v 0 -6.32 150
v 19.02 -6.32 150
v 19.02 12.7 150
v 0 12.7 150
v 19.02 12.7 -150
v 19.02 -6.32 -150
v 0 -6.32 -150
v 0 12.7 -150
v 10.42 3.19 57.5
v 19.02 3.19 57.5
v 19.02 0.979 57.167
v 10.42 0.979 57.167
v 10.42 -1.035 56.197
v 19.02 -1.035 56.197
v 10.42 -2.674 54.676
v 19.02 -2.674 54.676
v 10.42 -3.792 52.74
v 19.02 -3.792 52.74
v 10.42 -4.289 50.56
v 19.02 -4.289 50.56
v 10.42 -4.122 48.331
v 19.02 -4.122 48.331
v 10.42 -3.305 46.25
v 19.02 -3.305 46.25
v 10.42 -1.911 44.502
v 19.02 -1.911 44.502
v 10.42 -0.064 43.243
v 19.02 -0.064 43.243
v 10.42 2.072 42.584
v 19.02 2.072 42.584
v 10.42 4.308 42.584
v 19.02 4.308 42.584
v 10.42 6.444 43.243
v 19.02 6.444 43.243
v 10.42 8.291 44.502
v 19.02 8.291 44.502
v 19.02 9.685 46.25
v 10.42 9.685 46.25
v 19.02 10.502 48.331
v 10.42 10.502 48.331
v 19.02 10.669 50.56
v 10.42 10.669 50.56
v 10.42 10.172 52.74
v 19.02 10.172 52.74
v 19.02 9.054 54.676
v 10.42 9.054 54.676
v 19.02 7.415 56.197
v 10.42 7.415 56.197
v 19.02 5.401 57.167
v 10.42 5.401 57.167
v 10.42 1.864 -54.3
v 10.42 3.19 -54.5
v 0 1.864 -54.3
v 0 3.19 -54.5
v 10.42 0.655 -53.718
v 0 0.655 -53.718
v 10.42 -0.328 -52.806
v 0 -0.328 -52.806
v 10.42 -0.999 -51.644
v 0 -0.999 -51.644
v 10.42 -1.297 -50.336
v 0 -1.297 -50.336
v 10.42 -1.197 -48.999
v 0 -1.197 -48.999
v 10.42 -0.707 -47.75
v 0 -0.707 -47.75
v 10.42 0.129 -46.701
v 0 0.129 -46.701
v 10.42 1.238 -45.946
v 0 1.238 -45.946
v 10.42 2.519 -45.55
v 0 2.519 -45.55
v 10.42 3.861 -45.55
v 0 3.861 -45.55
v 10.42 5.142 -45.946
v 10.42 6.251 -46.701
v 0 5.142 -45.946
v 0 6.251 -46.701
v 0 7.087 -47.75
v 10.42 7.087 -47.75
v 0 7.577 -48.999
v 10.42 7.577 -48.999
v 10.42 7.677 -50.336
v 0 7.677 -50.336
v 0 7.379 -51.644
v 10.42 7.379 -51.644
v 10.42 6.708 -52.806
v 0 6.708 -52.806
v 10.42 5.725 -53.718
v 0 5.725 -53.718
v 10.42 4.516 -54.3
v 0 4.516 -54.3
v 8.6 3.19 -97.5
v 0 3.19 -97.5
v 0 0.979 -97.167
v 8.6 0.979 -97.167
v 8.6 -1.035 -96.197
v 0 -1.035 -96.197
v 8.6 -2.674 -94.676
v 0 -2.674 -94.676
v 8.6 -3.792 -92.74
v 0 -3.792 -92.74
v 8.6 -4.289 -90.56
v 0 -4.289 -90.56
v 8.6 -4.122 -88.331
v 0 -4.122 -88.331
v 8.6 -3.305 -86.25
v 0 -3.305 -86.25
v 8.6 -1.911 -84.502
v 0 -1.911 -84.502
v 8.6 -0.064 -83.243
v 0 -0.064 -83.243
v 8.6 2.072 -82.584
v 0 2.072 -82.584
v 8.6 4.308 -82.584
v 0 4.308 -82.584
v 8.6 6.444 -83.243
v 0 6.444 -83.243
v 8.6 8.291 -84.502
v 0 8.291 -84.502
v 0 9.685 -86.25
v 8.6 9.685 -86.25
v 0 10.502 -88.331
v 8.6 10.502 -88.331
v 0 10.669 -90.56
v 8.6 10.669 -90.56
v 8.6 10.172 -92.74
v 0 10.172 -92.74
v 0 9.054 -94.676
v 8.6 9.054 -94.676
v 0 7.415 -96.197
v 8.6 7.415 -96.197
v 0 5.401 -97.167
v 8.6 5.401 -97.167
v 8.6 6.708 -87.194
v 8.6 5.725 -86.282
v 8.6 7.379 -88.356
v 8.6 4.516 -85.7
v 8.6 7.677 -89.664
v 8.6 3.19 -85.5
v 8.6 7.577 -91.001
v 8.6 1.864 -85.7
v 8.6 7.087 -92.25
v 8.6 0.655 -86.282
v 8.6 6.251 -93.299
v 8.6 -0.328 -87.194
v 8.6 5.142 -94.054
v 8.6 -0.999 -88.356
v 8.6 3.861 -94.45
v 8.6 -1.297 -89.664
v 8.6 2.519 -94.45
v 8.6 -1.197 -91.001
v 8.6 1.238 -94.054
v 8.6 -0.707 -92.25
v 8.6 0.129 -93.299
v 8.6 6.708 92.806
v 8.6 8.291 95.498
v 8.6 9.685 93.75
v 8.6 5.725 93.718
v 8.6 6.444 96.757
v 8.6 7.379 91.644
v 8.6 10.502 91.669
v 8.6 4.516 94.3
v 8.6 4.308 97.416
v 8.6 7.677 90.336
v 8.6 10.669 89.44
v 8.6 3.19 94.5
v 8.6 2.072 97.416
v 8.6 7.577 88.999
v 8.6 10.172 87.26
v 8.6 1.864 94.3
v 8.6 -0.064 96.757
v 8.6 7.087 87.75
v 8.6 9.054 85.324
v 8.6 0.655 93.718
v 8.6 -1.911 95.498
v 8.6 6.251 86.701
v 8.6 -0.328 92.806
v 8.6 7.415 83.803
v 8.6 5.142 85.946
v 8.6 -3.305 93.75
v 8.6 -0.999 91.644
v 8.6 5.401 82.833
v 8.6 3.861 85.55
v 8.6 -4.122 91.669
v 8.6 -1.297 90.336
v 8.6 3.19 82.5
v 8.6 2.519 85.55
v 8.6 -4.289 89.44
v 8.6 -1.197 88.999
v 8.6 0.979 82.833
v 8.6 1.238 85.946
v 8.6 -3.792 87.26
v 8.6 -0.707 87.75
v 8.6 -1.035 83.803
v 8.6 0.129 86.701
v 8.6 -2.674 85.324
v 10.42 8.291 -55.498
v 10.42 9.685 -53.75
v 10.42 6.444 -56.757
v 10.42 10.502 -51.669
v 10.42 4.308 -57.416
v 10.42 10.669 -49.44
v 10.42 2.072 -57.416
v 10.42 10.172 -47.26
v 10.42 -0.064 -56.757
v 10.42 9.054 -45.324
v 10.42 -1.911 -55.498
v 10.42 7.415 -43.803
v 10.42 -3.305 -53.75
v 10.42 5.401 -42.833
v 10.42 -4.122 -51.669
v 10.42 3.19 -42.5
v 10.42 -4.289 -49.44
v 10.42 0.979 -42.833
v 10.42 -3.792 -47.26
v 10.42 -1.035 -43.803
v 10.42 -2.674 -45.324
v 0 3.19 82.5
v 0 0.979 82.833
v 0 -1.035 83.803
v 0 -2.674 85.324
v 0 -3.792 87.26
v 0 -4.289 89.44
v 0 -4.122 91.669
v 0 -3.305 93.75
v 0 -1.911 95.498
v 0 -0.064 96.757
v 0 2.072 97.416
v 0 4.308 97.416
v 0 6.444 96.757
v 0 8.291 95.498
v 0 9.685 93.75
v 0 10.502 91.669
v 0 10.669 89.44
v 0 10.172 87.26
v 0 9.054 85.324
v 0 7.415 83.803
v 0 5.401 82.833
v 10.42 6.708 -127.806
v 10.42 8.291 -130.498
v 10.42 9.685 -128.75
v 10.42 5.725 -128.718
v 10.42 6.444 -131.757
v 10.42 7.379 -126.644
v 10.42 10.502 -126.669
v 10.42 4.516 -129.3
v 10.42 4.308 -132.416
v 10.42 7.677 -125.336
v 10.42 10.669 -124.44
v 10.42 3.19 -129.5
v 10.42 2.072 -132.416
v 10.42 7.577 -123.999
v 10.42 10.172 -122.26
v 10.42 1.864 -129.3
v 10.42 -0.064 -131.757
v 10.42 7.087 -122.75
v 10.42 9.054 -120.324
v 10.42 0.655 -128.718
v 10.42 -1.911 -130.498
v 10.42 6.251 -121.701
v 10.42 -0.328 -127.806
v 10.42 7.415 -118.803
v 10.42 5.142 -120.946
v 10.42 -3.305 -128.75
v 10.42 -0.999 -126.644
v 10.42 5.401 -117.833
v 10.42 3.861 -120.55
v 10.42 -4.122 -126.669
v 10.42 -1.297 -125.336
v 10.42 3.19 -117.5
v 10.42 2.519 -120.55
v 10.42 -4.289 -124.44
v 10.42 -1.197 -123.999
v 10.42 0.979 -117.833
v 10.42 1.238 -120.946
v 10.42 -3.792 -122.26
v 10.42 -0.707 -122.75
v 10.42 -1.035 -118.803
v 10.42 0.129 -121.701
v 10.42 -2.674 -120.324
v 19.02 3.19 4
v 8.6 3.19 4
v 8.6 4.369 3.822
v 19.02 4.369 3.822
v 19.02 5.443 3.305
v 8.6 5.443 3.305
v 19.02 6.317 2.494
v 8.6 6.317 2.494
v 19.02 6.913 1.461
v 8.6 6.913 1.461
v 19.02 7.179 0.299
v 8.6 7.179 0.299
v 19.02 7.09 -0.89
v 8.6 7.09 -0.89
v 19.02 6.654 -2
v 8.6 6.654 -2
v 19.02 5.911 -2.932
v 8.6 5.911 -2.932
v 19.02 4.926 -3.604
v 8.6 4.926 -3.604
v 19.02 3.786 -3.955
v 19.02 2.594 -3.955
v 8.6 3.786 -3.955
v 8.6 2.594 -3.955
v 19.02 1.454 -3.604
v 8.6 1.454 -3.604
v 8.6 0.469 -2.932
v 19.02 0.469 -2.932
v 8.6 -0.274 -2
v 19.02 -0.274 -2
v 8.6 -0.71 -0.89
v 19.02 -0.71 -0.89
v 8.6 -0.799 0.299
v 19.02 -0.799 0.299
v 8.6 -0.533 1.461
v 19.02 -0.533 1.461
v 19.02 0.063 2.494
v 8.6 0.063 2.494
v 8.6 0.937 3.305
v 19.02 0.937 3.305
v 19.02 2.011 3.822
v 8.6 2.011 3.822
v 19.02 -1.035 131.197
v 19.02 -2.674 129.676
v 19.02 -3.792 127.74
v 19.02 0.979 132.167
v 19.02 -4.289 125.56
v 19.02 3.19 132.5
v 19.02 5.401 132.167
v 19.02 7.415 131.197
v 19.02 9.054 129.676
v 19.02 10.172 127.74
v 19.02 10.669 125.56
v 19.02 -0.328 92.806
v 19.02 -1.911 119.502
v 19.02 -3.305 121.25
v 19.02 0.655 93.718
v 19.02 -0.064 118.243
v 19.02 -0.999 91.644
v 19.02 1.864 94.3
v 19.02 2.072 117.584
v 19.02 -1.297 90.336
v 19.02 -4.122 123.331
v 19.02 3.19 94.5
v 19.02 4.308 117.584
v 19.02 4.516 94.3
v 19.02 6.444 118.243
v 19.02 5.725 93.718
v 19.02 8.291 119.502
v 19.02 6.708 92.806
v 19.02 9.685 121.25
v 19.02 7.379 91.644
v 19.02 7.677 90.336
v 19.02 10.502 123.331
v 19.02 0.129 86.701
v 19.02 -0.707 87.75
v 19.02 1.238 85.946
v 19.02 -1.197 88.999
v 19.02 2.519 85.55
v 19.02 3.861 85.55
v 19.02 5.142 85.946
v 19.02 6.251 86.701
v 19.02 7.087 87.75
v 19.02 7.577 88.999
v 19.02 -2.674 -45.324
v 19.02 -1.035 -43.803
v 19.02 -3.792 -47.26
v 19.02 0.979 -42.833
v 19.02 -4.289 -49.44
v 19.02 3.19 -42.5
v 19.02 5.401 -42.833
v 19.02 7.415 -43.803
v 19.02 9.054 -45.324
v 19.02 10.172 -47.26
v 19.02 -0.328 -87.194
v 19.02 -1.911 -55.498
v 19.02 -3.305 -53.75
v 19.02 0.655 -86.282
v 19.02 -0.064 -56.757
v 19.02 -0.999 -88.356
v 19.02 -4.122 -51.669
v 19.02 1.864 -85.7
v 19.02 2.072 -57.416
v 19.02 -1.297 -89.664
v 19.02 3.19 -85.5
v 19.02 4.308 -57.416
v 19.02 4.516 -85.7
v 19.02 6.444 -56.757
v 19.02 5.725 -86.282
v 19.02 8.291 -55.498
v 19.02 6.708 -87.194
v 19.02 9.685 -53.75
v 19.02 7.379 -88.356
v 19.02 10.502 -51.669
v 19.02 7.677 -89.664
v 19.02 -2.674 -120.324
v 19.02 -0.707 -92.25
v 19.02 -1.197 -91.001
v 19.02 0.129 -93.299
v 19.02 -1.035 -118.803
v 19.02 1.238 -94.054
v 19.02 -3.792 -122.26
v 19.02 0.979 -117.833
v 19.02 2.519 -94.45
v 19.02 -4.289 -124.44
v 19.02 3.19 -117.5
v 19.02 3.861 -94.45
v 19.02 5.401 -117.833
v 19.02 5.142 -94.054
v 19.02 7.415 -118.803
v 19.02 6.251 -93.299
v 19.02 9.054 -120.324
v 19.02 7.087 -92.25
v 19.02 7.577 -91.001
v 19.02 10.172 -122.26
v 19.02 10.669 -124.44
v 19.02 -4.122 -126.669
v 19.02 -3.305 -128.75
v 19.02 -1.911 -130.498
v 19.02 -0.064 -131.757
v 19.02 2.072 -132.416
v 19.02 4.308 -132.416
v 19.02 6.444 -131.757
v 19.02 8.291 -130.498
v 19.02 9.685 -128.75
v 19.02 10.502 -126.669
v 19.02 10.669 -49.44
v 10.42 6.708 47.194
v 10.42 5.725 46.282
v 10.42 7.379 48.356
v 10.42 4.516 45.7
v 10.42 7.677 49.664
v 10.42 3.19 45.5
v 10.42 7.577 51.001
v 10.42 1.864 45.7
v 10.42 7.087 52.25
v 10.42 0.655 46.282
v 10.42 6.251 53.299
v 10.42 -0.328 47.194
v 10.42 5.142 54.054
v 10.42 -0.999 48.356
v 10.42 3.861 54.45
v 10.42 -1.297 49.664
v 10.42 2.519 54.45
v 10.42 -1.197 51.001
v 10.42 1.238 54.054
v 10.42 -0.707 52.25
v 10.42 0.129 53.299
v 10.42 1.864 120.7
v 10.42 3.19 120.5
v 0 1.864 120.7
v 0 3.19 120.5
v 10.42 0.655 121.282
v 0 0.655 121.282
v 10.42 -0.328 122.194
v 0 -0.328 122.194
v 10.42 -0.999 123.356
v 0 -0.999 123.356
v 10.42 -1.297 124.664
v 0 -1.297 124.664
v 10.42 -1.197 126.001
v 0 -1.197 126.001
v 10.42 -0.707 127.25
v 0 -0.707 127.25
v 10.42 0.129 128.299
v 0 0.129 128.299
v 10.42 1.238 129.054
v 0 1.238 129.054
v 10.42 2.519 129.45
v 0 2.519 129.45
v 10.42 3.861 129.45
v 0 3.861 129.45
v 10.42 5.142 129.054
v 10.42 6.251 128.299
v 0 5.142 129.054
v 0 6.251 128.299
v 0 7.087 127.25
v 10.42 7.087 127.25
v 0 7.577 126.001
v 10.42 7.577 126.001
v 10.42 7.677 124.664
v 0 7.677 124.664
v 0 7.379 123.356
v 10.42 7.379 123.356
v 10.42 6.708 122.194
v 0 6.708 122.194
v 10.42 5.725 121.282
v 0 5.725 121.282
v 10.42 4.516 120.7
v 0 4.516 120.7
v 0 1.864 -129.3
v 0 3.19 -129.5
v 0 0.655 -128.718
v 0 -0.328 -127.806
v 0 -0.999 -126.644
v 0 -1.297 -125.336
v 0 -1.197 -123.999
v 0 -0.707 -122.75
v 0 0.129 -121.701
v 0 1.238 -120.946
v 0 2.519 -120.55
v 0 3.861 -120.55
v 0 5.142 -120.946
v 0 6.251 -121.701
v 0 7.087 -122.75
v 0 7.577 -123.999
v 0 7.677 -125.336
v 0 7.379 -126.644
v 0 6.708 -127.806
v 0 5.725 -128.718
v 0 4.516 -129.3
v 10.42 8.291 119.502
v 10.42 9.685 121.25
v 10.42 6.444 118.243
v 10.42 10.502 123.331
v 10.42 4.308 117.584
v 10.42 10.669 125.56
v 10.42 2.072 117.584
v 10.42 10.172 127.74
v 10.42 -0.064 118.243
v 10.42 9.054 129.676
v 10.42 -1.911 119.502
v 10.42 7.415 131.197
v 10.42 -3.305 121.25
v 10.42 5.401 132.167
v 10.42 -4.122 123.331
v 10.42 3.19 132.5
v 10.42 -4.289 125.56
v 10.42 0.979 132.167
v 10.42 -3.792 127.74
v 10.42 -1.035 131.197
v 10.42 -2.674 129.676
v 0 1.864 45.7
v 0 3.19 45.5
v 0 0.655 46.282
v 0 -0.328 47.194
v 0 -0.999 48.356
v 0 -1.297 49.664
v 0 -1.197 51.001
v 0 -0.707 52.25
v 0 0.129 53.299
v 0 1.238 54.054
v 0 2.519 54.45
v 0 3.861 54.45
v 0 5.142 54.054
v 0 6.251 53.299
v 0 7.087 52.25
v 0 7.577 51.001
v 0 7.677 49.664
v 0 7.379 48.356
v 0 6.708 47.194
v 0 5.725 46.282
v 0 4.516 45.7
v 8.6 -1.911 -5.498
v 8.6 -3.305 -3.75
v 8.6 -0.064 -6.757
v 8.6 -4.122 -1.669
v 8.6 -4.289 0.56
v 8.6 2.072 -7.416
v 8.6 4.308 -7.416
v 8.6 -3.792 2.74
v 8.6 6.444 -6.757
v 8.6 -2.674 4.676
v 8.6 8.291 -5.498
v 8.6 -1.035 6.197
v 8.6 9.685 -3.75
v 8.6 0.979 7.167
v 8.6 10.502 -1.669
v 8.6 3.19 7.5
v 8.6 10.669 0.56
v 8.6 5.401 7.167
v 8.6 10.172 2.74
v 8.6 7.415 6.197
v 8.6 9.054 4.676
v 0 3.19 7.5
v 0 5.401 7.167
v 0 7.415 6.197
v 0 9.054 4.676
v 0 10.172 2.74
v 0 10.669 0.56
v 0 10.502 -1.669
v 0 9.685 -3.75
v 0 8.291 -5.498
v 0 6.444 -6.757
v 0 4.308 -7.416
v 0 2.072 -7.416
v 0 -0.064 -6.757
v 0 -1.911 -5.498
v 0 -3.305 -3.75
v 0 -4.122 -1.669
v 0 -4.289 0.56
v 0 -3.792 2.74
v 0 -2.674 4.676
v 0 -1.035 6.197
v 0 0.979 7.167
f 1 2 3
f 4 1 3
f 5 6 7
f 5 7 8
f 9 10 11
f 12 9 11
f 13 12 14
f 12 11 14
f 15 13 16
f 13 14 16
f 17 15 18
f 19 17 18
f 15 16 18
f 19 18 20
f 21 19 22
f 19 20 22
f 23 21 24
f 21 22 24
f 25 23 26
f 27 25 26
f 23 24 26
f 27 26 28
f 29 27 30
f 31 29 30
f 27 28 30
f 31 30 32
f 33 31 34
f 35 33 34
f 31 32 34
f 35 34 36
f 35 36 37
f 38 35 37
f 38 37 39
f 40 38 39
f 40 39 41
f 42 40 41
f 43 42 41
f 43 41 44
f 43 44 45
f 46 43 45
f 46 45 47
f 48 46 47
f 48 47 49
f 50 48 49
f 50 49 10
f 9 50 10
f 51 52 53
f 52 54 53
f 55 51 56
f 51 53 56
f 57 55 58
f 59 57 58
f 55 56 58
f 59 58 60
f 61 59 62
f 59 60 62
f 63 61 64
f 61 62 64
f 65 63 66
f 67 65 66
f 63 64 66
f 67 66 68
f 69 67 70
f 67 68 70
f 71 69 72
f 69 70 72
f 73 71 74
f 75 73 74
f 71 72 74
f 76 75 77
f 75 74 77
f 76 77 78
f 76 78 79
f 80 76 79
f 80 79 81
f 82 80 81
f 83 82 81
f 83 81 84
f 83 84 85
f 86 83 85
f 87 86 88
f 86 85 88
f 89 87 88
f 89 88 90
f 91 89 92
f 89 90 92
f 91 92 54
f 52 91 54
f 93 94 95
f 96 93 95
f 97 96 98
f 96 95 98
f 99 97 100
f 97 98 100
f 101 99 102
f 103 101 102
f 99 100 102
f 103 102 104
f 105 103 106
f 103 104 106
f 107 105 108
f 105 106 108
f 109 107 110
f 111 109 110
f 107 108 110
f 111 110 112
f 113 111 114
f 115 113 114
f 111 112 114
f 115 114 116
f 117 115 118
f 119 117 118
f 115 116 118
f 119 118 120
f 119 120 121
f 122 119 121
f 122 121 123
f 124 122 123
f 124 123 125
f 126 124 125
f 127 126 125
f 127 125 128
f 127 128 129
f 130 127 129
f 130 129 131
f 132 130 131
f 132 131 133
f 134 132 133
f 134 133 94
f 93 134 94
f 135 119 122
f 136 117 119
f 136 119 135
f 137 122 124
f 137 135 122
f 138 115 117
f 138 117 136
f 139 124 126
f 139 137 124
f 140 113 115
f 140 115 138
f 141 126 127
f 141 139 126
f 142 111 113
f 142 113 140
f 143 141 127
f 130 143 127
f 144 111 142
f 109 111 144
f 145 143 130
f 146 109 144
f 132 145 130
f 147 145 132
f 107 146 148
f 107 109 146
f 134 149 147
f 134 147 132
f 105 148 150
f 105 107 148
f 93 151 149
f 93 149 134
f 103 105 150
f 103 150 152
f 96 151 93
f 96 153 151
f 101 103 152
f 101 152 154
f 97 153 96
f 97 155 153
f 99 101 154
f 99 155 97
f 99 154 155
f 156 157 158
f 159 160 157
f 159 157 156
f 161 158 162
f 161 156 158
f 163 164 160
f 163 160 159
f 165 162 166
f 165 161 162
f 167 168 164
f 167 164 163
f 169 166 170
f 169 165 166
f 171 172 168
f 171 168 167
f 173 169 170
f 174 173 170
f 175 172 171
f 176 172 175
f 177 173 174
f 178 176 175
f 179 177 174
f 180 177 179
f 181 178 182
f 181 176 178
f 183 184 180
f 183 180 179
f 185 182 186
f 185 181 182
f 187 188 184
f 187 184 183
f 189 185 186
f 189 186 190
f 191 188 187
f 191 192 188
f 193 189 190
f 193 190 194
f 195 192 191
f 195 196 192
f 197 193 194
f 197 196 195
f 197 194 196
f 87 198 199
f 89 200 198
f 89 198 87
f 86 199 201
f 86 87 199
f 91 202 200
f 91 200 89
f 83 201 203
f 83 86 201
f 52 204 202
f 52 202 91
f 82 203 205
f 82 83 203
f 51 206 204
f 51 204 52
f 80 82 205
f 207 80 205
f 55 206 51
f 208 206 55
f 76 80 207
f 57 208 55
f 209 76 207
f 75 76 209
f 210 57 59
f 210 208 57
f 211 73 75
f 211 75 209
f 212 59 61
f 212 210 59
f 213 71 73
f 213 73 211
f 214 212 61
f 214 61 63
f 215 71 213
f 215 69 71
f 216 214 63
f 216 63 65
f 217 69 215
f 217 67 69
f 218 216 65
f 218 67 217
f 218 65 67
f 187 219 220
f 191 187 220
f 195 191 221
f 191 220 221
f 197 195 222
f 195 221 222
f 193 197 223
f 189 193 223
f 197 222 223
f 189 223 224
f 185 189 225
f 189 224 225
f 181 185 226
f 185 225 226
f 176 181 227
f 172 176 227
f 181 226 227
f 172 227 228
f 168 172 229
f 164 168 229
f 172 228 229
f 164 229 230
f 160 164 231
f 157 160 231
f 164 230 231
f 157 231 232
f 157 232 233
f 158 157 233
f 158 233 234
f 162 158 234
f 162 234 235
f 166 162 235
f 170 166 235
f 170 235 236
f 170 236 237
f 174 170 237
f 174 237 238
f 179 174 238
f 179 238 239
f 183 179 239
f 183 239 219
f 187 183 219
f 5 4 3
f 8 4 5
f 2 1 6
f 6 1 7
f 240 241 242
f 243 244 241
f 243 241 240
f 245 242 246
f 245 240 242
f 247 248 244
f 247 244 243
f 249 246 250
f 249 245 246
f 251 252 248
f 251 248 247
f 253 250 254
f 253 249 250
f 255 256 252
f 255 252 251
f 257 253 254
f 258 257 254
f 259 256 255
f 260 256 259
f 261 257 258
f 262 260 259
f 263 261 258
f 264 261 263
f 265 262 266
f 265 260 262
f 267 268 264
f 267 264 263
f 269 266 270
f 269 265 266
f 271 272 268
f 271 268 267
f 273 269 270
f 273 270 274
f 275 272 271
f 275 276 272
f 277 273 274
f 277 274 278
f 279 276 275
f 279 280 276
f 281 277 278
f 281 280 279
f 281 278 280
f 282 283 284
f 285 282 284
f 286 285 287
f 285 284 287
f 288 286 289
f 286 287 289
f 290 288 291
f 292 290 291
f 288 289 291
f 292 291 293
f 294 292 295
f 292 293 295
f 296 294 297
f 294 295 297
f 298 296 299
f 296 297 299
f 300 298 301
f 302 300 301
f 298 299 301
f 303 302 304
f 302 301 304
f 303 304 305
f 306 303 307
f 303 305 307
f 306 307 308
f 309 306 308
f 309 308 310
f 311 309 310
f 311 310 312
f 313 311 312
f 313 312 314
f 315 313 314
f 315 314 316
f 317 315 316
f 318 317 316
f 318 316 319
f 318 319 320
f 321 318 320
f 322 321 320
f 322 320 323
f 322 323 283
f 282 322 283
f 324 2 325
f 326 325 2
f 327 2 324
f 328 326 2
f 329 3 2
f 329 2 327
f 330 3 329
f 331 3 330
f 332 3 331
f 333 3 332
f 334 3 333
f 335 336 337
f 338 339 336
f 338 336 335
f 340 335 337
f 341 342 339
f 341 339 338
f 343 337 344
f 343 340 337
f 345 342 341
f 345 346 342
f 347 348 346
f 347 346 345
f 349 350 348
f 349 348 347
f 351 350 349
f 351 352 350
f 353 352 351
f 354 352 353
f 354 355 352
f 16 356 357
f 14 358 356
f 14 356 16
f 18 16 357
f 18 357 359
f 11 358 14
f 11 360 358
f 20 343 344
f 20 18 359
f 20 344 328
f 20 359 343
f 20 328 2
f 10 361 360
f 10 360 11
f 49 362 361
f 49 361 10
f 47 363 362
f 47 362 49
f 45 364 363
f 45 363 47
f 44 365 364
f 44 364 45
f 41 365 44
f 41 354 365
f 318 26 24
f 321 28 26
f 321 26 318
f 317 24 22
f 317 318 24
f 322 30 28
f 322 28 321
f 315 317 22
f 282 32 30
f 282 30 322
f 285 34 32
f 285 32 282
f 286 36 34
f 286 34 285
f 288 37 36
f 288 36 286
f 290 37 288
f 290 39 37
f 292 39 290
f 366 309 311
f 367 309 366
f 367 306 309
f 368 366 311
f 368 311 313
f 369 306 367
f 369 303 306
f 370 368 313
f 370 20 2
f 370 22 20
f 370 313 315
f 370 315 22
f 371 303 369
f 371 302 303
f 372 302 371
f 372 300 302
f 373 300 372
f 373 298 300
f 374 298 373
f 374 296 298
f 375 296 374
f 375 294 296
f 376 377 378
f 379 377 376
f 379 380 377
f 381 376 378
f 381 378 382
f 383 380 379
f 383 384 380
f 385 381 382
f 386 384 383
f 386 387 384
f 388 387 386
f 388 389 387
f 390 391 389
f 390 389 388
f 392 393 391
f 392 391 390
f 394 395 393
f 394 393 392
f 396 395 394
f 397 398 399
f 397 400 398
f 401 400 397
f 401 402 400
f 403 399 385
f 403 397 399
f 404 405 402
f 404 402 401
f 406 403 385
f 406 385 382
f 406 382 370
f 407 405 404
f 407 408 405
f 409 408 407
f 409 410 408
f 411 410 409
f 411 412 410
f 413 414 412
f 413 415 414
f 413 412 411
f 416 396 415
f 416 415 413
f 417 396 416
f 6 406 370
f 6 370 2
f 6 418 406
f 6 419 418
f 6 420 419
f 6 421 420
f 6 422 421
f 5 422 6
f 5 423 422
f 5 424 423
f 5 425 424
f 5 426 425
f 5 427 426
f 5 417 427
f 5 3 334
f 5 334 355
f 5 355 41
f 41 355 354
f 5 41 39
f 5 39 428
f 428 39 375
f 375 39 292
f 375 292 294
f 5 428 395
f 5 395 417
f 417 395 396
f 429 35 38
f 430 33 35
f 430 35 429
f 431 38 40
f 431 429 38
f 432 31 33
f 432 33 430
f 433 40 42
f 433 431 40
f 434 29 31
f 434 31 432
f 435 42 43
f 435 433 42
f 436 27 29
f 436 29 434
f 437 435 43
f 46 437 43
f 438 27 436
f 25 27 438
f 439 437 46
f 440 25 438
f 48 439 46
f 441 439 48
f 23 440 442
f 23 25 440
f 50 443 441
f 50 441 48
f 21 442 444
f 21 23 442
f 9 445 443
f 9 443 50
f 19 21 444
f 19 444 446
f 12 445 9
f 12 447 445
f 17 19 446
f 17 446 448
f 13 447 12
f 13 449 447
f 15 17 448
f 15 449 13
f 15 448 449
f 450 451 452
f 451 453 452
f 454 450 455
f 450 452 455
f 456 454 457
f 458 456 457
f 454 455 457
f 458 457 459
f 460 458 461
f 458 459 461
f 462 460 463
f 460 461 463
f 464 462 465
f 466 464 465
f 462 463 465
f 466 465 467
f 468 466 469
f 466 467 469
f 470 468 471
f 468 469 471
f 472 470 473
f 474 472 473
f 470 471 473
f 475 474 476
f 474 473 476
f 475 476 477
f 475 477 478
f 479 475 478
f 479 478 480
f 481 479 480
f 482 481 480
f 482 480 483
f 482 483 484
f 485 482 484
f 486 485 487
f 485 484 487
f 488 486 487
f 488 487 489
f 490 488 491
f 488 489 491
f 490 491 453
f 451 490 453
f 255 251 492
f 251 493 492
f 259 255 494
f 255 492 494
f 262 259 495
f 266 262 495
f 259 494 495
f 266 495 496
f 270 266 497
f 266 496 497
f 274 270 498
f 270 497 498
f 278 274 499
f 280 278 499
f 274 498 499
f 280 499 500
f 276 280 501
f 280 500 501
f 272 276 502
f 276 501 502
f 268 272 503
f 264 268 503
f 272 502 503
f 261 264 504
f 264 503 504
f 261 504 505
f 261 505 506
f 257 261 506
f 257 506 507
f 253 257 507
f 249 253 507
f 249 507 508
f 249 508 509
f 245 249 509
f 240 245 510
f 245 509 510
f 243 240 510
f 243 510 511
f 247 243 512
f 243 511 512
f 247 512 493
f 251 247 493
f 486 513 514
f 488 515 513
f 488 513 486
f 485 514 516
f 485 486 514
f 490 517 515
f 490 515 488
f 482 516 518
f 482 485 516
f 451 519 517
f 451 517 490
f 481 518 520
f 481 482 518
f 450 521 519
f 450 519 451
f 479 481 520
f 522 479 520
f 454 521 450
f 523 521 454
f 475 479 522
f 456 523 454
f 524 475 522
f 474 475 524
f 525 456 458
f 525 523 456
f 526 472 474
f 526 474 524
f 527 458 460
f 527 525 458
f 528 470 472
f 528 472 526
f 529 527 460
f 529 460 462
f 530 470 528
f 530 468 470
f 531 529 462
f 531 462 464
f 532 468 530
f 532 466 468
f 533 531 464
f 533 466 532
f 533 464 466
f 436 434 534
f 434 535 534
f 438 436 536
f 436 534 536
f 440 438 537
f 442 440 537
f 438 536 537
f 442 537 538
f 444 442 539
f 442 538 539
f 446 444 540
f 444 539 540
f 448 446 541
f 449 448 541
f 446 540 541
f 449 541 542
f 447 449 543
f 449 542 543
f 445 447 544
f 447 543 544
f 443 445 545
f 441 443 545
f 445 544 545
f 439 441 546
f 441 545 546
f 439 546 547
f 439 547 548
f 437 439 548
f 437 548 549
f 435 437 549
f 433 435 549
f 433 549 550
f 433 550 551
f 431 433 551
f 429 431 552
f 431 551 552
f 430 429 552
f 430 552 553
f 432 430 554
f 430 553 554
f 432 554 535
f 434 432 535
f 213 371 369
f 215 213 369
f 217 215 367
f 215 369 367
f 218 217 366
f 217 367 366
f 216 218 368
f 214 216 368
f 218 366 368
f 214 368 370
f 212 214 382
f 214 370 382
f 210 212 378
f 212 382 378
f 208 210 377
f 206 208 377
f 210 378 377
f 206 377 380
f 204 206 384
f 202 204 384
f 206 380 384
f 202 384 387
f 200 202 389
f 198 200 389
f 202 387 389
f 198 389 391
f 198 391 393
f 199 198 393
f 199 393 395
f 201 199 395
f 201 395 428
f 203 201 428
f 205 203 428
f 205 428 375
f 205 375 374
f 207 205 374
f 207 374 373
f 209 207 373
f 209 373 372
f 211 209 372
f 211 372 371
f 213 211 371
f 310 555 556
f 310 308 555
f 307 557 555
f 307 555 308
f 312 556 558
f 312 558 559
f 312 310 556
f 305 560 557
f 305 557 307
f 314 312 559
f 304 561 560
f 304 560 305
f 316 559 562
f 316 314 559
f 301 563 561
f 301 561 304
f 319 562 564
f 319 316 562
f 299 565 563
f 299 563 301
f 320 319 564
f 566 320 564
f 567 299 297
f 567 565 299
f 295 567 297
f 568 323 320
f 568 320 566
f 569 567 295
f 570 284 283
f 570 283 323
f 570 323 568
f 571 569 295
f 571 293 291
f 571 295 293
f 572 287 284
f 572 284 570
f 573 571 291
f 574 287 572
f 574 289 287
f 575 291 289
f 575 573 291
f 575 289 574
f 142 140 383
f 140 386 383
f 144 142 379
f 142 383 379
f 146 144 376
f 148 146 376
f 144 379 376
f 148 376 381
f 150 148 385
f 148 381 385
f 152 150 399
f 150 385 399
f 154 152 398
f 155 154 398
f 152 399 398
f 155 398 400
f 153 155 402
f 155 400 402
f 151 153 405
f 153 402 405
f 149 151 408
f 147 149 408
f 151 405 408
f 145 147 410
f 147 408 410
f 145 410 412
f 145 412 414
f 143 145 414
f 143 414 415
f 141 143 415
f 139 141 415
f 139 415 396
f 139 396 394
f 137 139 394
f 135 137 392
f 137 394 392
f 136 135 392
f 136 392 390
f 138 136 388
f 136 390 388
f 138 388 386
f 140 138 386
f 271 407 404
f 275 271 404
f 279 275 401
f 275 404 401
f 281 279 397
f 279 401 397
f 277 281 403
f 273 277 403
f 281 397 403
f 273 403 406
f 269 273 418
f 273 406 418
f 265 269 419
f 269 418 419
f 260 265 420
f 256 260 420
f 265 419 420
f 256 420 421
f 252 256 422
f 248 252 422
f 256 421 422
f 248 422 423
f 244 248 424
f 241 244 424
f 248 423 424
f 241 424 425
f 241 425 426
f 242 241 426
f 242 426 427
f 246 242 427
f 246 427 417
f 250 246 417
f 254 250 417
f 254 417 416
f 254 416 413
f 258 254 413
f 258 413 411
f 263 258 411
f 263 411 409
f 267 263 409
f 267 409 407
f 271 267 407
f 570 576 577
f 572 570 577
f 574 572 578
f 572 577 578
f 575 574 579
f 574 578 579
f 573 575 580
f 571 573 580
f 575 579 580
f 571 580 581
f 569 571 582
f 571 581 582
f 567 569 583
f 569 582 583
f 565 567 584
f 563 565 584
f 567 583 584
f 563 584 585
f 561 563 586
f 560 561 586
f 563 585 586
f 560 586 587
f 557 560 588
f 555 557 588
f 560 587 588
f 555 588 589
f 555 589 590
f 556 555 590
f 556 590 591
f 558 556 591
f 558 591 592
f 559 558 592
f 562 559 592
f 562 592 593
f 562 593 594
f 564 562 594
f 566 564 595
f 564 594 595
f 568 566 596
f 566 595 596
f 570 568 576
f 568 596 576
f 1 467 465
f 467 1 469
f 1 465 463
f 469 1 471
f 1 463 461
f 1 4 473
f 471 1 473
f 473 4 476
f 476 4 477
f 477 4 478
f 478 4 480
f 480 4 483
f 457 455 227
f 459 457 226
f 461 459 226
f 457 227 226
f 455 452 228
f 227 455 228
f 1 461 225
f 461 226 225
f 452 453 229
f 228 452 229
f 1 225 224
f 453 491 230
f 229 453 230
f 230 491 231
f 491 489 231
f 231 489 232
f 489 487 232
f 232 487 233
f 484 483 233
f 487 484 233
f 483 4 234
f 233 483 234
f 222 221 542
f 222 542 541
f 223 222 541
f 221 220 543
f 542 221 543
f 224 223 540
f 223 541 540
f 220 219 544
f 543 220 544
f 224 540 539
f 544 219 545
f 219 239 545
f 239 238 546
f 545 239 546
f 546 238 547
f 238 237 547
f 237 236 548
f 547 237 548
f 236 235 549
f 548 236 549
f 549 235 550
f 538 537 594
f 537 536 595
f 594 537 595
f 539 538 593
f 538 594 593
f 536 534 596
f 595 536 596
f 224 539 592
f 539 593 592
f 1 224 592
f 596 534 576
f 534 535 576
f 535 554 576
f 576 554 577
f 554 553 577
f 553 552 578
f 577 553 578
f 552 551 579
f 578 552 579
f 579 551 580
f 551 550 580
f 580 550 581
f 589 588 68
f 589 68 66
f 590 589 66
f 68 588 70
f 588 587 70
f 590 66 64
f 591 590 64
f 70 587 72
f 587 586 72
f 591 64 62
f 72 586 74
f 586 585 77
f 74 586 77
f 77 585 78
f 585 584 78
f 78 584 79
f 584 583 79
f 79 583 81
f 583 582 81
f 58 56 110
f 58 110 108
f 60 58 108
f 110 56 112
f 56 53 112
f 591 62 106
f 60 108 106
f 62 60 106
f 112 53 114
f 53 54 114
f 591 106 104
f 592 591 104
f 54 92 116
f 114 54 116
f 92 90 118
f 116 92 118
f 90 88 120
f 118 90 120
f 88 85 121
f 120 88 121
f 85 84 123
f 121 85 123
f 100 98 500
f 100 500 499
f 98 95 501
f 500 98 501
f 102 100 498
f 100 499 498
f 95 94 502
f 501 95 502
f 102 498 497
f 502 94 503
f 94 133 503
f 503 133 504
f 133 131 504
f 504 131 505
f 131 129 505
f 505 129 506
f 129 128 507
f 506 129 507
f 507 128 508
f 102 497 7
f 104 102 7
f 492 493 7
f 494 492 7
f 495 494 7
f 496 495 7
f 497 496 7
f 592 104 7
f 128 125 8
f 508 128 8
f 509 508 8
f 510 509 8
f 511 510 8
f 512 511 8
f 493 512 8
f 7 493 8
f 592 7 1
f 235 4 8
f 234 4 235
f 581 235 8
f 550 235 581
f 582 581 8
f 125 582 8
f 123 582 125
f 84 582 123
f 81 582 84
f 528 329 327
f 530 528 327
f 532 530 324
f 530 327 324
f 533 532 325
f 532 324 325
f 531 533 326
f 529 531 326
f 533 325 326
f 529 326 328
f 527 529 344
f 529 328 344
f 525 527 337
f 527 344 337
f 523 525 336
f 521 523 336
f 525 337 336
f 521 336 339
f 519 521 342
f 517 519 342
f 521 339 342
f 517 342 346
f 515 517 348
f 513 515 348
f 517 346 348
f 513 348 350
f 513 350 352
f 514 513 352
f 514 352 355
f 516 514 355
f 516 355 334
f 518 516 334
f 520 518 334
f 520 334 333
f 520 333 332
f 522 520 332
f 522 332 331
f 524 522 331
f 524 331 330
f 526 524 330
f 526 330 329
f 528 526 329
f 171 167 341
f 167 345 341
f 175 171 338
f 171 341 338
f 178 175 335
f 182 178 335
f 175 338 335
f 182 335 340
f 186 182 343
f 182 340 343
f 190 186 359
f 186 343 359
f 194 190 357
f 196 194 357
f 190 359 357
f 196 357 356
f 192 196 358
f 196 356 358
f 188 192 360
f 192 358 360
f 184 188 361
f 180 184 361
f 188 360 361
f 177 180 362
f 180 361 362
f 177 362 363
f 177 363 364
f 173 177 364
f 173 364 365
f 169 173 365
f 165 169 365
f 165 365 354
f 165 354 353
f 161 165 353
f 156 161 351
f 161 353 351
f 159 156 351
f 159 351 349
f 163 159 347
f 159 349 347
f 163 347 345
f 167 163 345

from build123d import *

# Parameters (mm, degrees)
ESBO_O1_W                                            = 300
ESBO_O1_H                                            = 19.02
ESBO_O1_R                                            = 4
RESSALTO_EXTRUS_O1_DEPTH                             = 19.02
REBAIXO_PARA_PARAFUSO_ALLEN_SEXTAVADO_DE_D           = 9
REBAIXO_PARA_PARAFUSO_ALLEN_SEXTAVADO_DE_CBORE_D     = 15
REBAIXO_PARA_PARAFUSO_ALLEN_SEXTAVADO_DE_CBORE_DEPTH = 8.6
ESBO_O5_R                                            = 4
CORTE_EXTRUS_O1_DEPTH                                = 20.02
REBAIXO_PARA_PARAFUSO_ALLEN_SEXTAVAD_2_D             = 9
REBAIXO_PARA_PARAFUSO_ALLEN_SEXTAVAD_2_CBORE_D       = 15
REBAIXO_PARA_PARAFUSO_ALLEN_SEXTAVAD_2_CBORE_DEPTH   = 8.6
ESBO_O11_R                                           = 7.5
CORTE_EXTRUS_O2_DEPTH                                = 8.6


with BuildPart() as part:
    # Esboço1 → Ressalto-extrusão1 (new body)
    with BuildSketch(Plane(origin=(0, 0, 0), x_dir=(0, 0, -1), z_dir=(1, 0, 0))):
        with Locations((0, 3.19)):
            Rectangle(ESBO_O1_W, ESBO_O1_H)
        with Locations((-50, 3.19)):
            Circle(ESBO_O1_R, mode=Mode.SUBTRACT)
        with Locations((-125, 3.19)):
            Circle(ESBO_O1_R, mode=Mode.SUBTRACT)
        with Locations((50, 3.19)):
            Circle(ESBO_O1_R, mode=Mode.SUBTRACT)
        with Locations((125, 3.19)):
            Circle(ESBO_O1_R, mode=Mode.SUBTRACT)
    extrude(amount=RESSALTO_EXTRUS_O1_DEPTH)

    # Rebaixo para parafuso Allen sextavado de (through all)
    with Locations(Plane(origin=(19.02, 3.19, 125), x_dir=(0, 0, 1), z_dir=(1, 0, 0))):
        with Locations((0, 0), (-75, 0), (-175, 0), (-250, 0)):
            CounterBoreHole(REBAIXO_PARA_PARAFUSO_ALLEN_SEXTAVADO_DE_D / 2, REBAIXO_PARA_PARAFUSO_ALLEN_SEXTAVADO_DE_CBORE_D / 2, REBAIXO_PARA_PARAFUSO_ALLEN_SEXTAVADO_DE_CBORE_DEPTH)

    # Esboço5 → Corte-extrusão1 (cut, through all)
    with BuildSketch(Plane.ZY):
        with Locations((0, 3.19)):
            Circle(ESBO_O5_R)
        with Locations((90, 3.19)):
            Circle(ESBO_O5_R)
        with Locations((-90, 3.19)):
            Circle(ESBO_O5_R)
    extrude(amount=-CORTE_EXTRUS_O1_DEPTH, mode=Mode.SUBTRACT)

    # Rebaixo para parafuso Allen sextavad 2 (through all)
    with Locations(Plane(origin=(0, 3.19, -90), x_dir=(0, 0, -1), z_dir=(-1, 0, 0))):
        with Locations((0, 0), (-180, 0)):
            CounterBoreHole(REBAIXO_PARA_PARAFUSO_ALLEN_SEXTAVAD_2_D / 2, REBAIXO_PARA_PARAFUSO_ALLEN_SEXTAVAD_2_CBORE_D / 2, REBAIXO_PARA_PARAFUSO_ALLEN_SEXTAVAD_2_CBORE_DEPTH)

    # Esboço11 → Corte-extrusão2 (cut)
    with BuildSketch(Plane.ZY):
        with Locations((0, 3.19)):
            Circle(ESBO_O11_R)
    extrude(amount=-CORTE_EXTRUS_O2_DEPTH, mode=Mode.SUBTRACT)


solid = part.part
